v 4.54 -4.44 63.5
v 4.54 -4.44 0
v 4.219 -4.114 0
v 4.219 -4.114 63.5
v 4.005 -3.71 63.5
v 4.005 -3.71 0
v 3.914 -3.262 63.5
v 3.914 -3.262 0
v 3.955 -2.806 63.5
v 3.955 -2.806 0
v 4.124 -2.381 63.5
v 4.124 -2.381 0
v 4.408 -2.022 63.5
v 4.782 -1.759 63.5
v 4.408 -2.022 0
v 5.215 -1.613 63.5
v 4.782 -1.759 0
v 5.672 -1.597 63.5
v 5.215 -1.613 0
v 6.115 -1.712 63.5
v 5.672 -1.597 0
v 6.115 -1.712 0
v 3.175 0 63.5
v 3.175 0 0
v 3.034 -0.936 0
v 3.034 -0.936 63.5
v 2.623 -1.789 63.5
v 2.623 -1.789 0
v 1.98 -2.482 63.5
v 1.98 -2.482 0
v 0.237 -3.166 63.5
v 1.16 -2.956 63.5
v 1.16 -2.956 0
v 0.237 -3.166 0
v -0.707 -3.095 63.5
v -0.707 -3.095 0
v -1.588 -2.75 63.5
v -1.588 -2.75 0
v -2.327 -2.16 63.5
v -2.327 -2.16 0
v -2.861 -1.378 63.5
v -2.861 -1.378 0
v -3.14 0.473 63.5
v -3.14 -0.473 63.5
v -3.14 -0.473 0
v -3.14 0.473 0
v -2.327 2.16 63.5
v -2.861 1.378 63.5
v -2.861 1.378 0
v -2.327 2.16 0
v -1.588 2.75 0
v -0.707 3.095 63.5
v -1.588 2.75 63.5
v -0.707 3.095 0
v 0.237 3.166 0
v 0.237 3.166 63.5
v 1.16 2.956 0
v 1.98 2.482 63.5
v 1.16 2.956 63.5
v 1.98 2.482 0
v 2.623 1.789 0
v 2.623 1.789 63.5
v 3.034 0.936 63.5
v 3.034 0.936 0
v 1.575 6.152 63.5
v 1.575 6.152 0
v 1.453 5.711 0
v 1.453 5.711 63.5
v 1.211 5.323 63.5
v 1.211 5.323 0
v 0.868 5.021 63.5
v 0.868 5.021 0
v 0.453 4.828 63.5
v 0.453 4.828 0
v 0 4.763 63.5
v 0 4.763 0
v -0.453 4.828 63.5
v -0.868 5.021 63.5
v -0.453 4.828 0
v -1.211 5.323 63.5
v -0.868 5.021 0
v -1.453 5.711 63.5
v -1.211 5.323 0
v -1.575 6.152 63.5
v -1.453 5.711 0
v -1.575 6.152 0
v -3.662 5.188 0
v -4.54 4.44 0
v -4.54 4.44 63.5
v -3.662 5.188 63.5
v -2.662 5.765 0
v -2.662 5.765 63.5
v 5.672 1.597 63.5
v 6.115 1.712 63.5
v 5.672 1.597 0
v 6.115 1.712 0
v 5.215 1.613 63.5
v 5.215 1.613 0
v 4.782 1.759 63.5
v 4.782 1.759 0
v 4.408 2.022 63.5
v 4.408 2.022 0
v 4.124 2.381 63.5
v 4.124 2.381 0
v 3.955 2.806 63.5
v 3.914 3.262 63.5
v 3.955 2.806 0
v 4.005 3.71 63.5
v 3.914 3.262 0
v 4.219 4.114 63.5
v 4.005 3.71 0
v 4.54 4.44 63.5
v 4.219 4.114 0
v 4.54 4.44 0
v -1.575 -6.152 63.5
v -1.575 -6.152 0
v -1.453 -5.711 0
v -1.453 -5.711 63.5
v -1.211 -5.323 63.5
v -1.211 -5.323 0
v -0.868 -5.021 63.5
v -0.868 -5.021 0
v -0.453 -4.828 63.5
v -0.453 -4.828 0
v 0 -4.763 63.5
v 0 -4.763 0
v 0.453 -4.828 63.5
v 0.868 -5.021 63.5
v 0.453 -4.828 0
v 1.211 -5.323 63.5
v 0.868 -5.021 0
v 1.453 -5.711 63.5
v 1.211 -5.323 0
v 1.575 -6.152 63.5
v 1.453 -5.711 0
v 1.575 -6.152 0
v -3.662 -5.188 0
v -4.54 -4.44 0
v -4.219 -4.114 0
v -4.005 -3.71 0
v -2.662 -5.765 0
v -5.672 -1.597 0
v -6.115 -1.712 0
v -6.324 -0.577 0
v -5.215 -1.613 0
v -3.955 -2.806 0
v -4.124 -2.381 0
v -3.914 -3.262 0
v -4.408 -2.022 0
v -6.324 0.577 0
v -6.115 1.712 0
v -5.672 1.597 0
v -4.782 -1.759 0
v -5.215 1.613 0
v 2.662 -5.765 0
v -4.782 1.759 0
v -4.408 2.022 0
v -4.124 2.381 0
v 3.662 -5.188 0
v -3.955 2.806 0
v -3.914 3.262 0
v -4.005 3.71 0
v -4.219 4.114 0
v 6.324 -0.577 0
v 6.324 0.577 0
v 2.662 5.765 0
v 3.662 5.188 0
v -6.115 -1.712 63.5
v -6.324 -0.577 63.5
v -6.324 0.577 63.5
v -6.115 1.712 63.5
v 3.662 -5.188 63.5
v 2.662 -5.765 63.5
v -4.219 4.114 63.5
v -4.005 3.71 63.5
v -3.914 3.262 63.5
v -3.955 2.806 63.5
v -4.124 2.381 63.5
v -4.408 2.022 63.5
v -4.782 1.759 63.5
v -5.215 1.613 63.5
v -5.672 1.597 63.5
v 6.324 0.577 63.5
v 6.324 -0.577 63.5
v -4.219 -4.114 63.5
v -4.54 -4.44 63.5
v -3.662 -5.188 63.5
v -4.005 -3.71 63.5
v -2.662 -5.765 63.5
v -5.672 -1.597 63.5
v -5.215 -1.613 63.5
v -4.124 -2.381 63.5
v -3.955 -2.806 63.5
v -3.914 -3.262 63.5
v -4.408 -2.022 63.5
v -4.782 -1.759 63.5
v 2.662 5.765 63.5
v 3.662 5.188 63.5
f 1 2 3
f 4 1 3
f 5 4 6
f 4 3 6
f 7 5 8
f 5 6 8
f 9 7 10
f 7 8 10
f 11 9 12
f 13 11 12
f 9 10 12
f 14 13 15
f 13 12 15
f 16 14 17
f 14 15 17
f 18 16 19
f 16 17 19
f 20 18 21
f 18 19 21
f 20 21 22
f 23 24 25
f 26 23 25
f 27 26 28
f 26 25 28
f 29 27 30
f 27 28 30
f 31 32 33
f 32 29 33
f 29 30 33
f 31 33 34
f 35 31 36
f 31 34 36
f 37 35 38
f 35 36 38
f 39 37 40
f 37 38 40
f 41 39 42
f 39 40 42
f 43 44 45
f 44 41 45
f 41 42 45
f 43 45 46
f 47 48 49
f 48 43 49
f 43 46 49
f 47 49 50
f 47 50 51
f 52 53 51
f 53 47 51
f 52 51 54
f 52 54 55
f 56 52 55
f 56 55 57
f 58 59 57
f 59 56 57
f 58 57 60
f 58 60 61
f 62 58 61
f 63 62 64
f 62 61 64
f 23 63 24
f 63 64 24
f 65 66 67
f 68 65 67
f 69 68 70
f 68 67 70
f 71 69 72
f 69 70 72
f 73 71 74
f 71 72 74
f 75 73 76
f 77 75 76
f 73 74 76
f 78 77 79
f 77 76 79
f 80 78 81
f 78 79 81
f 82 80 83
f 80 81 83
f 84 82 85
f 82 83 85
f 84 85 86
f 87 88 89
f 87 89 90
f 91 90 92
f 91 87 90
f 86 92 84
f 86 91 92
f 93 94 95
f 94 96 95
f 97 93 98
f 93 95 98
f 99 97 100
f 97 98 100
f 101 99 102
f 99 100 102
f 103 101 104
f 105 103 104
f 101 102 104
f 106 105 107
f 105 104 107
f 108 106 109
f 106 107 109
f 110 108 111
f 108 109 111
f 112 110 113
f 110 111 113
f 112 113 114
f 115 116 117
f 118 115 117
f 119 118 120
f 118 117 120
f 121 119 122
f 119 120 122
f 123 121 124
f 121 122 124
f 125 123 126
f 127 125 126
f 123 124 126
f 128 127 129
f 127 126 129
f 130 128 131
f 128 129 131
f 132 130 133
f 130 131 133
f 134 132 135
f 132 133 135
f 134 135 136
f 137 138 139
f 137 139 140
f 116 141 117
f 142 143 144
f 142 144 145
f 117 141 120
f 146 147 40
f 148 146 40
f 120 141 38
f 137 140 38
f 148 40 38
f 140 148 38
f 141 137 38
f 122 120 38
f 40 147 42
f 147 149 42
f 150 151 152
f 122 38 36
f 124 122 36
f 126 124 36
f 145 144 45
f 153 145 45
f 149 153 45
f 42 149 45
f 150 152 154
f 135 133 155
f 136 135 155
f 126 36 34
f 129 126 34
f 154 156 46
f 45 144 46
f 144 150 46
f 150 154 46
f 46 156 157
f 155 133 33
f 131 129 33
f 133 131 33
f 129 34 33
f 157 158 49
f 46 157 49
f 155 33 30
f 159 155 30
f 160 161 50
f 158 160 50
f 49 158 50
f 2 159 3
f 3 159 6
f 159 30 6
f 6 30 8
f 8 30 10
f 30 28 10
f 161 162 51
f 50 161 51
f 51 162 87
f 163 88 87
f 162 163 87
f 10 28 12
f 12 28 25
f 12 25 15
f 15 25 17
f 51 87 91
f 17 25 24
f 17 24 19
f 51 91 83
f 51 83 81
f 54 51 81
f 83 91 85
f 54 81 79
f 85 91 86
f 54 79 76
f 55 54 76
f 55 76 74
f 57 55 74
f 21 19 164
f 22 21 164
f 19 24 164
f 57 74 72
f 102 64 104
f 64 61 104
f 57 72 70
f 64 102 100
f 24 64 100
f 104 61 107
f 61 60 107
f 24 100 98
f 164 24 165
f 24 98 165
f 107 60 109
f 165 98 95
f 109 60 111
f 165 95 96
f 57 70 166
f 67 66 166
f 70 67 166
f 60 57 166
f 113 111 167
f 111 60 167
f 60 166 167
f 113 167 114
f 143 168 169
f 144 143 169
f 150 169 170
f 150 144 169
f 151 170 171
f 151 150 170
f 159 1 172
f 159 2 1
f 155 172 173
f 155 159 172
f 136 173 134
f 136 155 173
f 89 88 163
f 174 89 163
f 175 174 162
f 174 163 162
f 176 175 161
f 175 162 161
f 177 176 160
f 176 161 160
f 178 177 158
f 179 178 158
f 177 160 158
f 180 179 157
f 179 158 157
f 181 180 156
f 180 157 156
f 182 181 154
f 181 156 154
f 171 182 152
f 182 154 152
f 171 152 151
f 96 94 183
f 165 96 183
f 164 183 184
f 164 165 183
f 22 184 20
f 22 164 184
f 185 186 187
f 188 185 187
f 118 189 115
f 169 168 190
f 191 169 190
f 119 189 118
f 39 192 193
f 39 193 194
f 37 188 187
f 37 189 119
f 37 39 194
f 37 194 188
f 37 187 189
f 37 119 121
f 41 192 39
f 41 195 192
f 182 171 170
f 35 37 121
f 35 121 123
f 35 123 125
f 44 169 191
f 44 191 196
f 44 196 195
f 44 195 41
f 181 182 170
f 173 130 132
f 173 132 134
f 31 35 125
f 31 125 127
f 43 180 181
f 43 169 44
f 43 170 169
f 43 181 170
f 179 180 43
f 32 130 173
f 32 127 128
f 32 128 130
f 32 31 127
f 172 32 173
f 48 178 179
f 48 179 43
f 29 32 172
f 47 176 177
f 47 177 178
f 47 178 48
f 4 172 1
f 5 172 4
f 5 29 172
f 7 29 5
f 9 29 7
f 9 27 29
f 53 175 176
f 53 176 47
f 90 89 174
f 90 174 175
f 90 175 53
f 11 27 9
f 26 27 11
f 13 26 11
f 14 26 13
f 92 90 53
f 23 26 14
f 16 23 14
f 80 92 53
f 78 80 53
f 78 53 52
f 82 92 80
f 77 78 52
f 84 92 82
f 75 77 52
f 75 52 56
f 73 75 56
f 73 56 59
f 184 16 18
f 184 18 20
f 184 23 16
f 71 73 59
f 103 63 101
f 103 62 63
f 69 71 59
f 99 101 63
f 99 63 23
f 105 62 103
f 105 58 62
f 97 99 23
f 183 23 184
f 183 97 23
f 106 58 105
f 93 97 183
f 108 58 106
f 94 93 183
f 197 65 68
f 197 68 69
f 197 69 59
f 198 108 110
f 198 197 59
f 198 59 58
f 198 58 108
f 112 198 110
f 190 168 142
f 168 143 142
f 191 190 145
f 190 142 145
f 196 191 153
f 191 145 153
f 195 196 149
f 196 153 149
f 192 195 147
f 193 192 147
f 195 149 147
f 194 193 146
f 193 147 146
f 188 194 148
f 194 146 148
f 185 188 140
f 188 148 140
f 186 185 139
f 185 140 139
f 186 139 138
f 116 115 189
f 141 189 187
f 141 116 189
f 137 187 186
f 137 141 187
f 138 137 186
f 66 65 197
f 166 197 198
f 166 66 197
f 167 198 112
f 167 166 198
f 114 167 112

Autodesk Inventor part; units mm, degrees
ref_plane "YZ Plane" through (0, 0, 0) normal (1, 0, 0) x (0, 1, 0)
ref_plane "XZ Plane" through (0, 0, 0) normal (0, 1, 0) x (-1, 0, 0)
ref_plane "XY Plane" through (0, 0, 0) normal (0, 0, 1) x (1, 0, 0)
sketch "Sketch1" plane through (0, 0, 0) normal (0, 0, 1) x (1, 0, 0)
  circle A0 centre (0, 0) radius 3.175
  circle A1 centre (0, 0) radius 6.35
  dimension "d0" = 12.7
  dimension "d1" = 6.35
extrude "Extrusion1" add sketch "Sketch1" along normal blind 63.5
sketch "Sketch2" plane through (0, 0, 0) normal (0, 0, -1) x (-1, 0, 0)
  circle A0 centre (0, 0) radius 6.35 projected
  arc A1 (-1.575, 6.1516) -> (1.575, 6.1516) centre (0, 6.35) ccw
  line L0 (0, 6.35) -> (0, 0) construction
  arc A2 (1.575, 6.1516) -> (-1.575, 6.1516) centre (0, 0) ccw
  dimension "d4" = 1.5875
extrude "Extrusion2" cut sketch "Sketch2" against normal through all contours A1 A0 picked at (0, 5.8061)
pattern_circular "Circular Pattern1" count 6 over 360 about axis through (0, 0, 0) along (0, 0, 1) of "Extrusion2"
properties part number "HopperPlateOffset" material "Aluminum-6061"
